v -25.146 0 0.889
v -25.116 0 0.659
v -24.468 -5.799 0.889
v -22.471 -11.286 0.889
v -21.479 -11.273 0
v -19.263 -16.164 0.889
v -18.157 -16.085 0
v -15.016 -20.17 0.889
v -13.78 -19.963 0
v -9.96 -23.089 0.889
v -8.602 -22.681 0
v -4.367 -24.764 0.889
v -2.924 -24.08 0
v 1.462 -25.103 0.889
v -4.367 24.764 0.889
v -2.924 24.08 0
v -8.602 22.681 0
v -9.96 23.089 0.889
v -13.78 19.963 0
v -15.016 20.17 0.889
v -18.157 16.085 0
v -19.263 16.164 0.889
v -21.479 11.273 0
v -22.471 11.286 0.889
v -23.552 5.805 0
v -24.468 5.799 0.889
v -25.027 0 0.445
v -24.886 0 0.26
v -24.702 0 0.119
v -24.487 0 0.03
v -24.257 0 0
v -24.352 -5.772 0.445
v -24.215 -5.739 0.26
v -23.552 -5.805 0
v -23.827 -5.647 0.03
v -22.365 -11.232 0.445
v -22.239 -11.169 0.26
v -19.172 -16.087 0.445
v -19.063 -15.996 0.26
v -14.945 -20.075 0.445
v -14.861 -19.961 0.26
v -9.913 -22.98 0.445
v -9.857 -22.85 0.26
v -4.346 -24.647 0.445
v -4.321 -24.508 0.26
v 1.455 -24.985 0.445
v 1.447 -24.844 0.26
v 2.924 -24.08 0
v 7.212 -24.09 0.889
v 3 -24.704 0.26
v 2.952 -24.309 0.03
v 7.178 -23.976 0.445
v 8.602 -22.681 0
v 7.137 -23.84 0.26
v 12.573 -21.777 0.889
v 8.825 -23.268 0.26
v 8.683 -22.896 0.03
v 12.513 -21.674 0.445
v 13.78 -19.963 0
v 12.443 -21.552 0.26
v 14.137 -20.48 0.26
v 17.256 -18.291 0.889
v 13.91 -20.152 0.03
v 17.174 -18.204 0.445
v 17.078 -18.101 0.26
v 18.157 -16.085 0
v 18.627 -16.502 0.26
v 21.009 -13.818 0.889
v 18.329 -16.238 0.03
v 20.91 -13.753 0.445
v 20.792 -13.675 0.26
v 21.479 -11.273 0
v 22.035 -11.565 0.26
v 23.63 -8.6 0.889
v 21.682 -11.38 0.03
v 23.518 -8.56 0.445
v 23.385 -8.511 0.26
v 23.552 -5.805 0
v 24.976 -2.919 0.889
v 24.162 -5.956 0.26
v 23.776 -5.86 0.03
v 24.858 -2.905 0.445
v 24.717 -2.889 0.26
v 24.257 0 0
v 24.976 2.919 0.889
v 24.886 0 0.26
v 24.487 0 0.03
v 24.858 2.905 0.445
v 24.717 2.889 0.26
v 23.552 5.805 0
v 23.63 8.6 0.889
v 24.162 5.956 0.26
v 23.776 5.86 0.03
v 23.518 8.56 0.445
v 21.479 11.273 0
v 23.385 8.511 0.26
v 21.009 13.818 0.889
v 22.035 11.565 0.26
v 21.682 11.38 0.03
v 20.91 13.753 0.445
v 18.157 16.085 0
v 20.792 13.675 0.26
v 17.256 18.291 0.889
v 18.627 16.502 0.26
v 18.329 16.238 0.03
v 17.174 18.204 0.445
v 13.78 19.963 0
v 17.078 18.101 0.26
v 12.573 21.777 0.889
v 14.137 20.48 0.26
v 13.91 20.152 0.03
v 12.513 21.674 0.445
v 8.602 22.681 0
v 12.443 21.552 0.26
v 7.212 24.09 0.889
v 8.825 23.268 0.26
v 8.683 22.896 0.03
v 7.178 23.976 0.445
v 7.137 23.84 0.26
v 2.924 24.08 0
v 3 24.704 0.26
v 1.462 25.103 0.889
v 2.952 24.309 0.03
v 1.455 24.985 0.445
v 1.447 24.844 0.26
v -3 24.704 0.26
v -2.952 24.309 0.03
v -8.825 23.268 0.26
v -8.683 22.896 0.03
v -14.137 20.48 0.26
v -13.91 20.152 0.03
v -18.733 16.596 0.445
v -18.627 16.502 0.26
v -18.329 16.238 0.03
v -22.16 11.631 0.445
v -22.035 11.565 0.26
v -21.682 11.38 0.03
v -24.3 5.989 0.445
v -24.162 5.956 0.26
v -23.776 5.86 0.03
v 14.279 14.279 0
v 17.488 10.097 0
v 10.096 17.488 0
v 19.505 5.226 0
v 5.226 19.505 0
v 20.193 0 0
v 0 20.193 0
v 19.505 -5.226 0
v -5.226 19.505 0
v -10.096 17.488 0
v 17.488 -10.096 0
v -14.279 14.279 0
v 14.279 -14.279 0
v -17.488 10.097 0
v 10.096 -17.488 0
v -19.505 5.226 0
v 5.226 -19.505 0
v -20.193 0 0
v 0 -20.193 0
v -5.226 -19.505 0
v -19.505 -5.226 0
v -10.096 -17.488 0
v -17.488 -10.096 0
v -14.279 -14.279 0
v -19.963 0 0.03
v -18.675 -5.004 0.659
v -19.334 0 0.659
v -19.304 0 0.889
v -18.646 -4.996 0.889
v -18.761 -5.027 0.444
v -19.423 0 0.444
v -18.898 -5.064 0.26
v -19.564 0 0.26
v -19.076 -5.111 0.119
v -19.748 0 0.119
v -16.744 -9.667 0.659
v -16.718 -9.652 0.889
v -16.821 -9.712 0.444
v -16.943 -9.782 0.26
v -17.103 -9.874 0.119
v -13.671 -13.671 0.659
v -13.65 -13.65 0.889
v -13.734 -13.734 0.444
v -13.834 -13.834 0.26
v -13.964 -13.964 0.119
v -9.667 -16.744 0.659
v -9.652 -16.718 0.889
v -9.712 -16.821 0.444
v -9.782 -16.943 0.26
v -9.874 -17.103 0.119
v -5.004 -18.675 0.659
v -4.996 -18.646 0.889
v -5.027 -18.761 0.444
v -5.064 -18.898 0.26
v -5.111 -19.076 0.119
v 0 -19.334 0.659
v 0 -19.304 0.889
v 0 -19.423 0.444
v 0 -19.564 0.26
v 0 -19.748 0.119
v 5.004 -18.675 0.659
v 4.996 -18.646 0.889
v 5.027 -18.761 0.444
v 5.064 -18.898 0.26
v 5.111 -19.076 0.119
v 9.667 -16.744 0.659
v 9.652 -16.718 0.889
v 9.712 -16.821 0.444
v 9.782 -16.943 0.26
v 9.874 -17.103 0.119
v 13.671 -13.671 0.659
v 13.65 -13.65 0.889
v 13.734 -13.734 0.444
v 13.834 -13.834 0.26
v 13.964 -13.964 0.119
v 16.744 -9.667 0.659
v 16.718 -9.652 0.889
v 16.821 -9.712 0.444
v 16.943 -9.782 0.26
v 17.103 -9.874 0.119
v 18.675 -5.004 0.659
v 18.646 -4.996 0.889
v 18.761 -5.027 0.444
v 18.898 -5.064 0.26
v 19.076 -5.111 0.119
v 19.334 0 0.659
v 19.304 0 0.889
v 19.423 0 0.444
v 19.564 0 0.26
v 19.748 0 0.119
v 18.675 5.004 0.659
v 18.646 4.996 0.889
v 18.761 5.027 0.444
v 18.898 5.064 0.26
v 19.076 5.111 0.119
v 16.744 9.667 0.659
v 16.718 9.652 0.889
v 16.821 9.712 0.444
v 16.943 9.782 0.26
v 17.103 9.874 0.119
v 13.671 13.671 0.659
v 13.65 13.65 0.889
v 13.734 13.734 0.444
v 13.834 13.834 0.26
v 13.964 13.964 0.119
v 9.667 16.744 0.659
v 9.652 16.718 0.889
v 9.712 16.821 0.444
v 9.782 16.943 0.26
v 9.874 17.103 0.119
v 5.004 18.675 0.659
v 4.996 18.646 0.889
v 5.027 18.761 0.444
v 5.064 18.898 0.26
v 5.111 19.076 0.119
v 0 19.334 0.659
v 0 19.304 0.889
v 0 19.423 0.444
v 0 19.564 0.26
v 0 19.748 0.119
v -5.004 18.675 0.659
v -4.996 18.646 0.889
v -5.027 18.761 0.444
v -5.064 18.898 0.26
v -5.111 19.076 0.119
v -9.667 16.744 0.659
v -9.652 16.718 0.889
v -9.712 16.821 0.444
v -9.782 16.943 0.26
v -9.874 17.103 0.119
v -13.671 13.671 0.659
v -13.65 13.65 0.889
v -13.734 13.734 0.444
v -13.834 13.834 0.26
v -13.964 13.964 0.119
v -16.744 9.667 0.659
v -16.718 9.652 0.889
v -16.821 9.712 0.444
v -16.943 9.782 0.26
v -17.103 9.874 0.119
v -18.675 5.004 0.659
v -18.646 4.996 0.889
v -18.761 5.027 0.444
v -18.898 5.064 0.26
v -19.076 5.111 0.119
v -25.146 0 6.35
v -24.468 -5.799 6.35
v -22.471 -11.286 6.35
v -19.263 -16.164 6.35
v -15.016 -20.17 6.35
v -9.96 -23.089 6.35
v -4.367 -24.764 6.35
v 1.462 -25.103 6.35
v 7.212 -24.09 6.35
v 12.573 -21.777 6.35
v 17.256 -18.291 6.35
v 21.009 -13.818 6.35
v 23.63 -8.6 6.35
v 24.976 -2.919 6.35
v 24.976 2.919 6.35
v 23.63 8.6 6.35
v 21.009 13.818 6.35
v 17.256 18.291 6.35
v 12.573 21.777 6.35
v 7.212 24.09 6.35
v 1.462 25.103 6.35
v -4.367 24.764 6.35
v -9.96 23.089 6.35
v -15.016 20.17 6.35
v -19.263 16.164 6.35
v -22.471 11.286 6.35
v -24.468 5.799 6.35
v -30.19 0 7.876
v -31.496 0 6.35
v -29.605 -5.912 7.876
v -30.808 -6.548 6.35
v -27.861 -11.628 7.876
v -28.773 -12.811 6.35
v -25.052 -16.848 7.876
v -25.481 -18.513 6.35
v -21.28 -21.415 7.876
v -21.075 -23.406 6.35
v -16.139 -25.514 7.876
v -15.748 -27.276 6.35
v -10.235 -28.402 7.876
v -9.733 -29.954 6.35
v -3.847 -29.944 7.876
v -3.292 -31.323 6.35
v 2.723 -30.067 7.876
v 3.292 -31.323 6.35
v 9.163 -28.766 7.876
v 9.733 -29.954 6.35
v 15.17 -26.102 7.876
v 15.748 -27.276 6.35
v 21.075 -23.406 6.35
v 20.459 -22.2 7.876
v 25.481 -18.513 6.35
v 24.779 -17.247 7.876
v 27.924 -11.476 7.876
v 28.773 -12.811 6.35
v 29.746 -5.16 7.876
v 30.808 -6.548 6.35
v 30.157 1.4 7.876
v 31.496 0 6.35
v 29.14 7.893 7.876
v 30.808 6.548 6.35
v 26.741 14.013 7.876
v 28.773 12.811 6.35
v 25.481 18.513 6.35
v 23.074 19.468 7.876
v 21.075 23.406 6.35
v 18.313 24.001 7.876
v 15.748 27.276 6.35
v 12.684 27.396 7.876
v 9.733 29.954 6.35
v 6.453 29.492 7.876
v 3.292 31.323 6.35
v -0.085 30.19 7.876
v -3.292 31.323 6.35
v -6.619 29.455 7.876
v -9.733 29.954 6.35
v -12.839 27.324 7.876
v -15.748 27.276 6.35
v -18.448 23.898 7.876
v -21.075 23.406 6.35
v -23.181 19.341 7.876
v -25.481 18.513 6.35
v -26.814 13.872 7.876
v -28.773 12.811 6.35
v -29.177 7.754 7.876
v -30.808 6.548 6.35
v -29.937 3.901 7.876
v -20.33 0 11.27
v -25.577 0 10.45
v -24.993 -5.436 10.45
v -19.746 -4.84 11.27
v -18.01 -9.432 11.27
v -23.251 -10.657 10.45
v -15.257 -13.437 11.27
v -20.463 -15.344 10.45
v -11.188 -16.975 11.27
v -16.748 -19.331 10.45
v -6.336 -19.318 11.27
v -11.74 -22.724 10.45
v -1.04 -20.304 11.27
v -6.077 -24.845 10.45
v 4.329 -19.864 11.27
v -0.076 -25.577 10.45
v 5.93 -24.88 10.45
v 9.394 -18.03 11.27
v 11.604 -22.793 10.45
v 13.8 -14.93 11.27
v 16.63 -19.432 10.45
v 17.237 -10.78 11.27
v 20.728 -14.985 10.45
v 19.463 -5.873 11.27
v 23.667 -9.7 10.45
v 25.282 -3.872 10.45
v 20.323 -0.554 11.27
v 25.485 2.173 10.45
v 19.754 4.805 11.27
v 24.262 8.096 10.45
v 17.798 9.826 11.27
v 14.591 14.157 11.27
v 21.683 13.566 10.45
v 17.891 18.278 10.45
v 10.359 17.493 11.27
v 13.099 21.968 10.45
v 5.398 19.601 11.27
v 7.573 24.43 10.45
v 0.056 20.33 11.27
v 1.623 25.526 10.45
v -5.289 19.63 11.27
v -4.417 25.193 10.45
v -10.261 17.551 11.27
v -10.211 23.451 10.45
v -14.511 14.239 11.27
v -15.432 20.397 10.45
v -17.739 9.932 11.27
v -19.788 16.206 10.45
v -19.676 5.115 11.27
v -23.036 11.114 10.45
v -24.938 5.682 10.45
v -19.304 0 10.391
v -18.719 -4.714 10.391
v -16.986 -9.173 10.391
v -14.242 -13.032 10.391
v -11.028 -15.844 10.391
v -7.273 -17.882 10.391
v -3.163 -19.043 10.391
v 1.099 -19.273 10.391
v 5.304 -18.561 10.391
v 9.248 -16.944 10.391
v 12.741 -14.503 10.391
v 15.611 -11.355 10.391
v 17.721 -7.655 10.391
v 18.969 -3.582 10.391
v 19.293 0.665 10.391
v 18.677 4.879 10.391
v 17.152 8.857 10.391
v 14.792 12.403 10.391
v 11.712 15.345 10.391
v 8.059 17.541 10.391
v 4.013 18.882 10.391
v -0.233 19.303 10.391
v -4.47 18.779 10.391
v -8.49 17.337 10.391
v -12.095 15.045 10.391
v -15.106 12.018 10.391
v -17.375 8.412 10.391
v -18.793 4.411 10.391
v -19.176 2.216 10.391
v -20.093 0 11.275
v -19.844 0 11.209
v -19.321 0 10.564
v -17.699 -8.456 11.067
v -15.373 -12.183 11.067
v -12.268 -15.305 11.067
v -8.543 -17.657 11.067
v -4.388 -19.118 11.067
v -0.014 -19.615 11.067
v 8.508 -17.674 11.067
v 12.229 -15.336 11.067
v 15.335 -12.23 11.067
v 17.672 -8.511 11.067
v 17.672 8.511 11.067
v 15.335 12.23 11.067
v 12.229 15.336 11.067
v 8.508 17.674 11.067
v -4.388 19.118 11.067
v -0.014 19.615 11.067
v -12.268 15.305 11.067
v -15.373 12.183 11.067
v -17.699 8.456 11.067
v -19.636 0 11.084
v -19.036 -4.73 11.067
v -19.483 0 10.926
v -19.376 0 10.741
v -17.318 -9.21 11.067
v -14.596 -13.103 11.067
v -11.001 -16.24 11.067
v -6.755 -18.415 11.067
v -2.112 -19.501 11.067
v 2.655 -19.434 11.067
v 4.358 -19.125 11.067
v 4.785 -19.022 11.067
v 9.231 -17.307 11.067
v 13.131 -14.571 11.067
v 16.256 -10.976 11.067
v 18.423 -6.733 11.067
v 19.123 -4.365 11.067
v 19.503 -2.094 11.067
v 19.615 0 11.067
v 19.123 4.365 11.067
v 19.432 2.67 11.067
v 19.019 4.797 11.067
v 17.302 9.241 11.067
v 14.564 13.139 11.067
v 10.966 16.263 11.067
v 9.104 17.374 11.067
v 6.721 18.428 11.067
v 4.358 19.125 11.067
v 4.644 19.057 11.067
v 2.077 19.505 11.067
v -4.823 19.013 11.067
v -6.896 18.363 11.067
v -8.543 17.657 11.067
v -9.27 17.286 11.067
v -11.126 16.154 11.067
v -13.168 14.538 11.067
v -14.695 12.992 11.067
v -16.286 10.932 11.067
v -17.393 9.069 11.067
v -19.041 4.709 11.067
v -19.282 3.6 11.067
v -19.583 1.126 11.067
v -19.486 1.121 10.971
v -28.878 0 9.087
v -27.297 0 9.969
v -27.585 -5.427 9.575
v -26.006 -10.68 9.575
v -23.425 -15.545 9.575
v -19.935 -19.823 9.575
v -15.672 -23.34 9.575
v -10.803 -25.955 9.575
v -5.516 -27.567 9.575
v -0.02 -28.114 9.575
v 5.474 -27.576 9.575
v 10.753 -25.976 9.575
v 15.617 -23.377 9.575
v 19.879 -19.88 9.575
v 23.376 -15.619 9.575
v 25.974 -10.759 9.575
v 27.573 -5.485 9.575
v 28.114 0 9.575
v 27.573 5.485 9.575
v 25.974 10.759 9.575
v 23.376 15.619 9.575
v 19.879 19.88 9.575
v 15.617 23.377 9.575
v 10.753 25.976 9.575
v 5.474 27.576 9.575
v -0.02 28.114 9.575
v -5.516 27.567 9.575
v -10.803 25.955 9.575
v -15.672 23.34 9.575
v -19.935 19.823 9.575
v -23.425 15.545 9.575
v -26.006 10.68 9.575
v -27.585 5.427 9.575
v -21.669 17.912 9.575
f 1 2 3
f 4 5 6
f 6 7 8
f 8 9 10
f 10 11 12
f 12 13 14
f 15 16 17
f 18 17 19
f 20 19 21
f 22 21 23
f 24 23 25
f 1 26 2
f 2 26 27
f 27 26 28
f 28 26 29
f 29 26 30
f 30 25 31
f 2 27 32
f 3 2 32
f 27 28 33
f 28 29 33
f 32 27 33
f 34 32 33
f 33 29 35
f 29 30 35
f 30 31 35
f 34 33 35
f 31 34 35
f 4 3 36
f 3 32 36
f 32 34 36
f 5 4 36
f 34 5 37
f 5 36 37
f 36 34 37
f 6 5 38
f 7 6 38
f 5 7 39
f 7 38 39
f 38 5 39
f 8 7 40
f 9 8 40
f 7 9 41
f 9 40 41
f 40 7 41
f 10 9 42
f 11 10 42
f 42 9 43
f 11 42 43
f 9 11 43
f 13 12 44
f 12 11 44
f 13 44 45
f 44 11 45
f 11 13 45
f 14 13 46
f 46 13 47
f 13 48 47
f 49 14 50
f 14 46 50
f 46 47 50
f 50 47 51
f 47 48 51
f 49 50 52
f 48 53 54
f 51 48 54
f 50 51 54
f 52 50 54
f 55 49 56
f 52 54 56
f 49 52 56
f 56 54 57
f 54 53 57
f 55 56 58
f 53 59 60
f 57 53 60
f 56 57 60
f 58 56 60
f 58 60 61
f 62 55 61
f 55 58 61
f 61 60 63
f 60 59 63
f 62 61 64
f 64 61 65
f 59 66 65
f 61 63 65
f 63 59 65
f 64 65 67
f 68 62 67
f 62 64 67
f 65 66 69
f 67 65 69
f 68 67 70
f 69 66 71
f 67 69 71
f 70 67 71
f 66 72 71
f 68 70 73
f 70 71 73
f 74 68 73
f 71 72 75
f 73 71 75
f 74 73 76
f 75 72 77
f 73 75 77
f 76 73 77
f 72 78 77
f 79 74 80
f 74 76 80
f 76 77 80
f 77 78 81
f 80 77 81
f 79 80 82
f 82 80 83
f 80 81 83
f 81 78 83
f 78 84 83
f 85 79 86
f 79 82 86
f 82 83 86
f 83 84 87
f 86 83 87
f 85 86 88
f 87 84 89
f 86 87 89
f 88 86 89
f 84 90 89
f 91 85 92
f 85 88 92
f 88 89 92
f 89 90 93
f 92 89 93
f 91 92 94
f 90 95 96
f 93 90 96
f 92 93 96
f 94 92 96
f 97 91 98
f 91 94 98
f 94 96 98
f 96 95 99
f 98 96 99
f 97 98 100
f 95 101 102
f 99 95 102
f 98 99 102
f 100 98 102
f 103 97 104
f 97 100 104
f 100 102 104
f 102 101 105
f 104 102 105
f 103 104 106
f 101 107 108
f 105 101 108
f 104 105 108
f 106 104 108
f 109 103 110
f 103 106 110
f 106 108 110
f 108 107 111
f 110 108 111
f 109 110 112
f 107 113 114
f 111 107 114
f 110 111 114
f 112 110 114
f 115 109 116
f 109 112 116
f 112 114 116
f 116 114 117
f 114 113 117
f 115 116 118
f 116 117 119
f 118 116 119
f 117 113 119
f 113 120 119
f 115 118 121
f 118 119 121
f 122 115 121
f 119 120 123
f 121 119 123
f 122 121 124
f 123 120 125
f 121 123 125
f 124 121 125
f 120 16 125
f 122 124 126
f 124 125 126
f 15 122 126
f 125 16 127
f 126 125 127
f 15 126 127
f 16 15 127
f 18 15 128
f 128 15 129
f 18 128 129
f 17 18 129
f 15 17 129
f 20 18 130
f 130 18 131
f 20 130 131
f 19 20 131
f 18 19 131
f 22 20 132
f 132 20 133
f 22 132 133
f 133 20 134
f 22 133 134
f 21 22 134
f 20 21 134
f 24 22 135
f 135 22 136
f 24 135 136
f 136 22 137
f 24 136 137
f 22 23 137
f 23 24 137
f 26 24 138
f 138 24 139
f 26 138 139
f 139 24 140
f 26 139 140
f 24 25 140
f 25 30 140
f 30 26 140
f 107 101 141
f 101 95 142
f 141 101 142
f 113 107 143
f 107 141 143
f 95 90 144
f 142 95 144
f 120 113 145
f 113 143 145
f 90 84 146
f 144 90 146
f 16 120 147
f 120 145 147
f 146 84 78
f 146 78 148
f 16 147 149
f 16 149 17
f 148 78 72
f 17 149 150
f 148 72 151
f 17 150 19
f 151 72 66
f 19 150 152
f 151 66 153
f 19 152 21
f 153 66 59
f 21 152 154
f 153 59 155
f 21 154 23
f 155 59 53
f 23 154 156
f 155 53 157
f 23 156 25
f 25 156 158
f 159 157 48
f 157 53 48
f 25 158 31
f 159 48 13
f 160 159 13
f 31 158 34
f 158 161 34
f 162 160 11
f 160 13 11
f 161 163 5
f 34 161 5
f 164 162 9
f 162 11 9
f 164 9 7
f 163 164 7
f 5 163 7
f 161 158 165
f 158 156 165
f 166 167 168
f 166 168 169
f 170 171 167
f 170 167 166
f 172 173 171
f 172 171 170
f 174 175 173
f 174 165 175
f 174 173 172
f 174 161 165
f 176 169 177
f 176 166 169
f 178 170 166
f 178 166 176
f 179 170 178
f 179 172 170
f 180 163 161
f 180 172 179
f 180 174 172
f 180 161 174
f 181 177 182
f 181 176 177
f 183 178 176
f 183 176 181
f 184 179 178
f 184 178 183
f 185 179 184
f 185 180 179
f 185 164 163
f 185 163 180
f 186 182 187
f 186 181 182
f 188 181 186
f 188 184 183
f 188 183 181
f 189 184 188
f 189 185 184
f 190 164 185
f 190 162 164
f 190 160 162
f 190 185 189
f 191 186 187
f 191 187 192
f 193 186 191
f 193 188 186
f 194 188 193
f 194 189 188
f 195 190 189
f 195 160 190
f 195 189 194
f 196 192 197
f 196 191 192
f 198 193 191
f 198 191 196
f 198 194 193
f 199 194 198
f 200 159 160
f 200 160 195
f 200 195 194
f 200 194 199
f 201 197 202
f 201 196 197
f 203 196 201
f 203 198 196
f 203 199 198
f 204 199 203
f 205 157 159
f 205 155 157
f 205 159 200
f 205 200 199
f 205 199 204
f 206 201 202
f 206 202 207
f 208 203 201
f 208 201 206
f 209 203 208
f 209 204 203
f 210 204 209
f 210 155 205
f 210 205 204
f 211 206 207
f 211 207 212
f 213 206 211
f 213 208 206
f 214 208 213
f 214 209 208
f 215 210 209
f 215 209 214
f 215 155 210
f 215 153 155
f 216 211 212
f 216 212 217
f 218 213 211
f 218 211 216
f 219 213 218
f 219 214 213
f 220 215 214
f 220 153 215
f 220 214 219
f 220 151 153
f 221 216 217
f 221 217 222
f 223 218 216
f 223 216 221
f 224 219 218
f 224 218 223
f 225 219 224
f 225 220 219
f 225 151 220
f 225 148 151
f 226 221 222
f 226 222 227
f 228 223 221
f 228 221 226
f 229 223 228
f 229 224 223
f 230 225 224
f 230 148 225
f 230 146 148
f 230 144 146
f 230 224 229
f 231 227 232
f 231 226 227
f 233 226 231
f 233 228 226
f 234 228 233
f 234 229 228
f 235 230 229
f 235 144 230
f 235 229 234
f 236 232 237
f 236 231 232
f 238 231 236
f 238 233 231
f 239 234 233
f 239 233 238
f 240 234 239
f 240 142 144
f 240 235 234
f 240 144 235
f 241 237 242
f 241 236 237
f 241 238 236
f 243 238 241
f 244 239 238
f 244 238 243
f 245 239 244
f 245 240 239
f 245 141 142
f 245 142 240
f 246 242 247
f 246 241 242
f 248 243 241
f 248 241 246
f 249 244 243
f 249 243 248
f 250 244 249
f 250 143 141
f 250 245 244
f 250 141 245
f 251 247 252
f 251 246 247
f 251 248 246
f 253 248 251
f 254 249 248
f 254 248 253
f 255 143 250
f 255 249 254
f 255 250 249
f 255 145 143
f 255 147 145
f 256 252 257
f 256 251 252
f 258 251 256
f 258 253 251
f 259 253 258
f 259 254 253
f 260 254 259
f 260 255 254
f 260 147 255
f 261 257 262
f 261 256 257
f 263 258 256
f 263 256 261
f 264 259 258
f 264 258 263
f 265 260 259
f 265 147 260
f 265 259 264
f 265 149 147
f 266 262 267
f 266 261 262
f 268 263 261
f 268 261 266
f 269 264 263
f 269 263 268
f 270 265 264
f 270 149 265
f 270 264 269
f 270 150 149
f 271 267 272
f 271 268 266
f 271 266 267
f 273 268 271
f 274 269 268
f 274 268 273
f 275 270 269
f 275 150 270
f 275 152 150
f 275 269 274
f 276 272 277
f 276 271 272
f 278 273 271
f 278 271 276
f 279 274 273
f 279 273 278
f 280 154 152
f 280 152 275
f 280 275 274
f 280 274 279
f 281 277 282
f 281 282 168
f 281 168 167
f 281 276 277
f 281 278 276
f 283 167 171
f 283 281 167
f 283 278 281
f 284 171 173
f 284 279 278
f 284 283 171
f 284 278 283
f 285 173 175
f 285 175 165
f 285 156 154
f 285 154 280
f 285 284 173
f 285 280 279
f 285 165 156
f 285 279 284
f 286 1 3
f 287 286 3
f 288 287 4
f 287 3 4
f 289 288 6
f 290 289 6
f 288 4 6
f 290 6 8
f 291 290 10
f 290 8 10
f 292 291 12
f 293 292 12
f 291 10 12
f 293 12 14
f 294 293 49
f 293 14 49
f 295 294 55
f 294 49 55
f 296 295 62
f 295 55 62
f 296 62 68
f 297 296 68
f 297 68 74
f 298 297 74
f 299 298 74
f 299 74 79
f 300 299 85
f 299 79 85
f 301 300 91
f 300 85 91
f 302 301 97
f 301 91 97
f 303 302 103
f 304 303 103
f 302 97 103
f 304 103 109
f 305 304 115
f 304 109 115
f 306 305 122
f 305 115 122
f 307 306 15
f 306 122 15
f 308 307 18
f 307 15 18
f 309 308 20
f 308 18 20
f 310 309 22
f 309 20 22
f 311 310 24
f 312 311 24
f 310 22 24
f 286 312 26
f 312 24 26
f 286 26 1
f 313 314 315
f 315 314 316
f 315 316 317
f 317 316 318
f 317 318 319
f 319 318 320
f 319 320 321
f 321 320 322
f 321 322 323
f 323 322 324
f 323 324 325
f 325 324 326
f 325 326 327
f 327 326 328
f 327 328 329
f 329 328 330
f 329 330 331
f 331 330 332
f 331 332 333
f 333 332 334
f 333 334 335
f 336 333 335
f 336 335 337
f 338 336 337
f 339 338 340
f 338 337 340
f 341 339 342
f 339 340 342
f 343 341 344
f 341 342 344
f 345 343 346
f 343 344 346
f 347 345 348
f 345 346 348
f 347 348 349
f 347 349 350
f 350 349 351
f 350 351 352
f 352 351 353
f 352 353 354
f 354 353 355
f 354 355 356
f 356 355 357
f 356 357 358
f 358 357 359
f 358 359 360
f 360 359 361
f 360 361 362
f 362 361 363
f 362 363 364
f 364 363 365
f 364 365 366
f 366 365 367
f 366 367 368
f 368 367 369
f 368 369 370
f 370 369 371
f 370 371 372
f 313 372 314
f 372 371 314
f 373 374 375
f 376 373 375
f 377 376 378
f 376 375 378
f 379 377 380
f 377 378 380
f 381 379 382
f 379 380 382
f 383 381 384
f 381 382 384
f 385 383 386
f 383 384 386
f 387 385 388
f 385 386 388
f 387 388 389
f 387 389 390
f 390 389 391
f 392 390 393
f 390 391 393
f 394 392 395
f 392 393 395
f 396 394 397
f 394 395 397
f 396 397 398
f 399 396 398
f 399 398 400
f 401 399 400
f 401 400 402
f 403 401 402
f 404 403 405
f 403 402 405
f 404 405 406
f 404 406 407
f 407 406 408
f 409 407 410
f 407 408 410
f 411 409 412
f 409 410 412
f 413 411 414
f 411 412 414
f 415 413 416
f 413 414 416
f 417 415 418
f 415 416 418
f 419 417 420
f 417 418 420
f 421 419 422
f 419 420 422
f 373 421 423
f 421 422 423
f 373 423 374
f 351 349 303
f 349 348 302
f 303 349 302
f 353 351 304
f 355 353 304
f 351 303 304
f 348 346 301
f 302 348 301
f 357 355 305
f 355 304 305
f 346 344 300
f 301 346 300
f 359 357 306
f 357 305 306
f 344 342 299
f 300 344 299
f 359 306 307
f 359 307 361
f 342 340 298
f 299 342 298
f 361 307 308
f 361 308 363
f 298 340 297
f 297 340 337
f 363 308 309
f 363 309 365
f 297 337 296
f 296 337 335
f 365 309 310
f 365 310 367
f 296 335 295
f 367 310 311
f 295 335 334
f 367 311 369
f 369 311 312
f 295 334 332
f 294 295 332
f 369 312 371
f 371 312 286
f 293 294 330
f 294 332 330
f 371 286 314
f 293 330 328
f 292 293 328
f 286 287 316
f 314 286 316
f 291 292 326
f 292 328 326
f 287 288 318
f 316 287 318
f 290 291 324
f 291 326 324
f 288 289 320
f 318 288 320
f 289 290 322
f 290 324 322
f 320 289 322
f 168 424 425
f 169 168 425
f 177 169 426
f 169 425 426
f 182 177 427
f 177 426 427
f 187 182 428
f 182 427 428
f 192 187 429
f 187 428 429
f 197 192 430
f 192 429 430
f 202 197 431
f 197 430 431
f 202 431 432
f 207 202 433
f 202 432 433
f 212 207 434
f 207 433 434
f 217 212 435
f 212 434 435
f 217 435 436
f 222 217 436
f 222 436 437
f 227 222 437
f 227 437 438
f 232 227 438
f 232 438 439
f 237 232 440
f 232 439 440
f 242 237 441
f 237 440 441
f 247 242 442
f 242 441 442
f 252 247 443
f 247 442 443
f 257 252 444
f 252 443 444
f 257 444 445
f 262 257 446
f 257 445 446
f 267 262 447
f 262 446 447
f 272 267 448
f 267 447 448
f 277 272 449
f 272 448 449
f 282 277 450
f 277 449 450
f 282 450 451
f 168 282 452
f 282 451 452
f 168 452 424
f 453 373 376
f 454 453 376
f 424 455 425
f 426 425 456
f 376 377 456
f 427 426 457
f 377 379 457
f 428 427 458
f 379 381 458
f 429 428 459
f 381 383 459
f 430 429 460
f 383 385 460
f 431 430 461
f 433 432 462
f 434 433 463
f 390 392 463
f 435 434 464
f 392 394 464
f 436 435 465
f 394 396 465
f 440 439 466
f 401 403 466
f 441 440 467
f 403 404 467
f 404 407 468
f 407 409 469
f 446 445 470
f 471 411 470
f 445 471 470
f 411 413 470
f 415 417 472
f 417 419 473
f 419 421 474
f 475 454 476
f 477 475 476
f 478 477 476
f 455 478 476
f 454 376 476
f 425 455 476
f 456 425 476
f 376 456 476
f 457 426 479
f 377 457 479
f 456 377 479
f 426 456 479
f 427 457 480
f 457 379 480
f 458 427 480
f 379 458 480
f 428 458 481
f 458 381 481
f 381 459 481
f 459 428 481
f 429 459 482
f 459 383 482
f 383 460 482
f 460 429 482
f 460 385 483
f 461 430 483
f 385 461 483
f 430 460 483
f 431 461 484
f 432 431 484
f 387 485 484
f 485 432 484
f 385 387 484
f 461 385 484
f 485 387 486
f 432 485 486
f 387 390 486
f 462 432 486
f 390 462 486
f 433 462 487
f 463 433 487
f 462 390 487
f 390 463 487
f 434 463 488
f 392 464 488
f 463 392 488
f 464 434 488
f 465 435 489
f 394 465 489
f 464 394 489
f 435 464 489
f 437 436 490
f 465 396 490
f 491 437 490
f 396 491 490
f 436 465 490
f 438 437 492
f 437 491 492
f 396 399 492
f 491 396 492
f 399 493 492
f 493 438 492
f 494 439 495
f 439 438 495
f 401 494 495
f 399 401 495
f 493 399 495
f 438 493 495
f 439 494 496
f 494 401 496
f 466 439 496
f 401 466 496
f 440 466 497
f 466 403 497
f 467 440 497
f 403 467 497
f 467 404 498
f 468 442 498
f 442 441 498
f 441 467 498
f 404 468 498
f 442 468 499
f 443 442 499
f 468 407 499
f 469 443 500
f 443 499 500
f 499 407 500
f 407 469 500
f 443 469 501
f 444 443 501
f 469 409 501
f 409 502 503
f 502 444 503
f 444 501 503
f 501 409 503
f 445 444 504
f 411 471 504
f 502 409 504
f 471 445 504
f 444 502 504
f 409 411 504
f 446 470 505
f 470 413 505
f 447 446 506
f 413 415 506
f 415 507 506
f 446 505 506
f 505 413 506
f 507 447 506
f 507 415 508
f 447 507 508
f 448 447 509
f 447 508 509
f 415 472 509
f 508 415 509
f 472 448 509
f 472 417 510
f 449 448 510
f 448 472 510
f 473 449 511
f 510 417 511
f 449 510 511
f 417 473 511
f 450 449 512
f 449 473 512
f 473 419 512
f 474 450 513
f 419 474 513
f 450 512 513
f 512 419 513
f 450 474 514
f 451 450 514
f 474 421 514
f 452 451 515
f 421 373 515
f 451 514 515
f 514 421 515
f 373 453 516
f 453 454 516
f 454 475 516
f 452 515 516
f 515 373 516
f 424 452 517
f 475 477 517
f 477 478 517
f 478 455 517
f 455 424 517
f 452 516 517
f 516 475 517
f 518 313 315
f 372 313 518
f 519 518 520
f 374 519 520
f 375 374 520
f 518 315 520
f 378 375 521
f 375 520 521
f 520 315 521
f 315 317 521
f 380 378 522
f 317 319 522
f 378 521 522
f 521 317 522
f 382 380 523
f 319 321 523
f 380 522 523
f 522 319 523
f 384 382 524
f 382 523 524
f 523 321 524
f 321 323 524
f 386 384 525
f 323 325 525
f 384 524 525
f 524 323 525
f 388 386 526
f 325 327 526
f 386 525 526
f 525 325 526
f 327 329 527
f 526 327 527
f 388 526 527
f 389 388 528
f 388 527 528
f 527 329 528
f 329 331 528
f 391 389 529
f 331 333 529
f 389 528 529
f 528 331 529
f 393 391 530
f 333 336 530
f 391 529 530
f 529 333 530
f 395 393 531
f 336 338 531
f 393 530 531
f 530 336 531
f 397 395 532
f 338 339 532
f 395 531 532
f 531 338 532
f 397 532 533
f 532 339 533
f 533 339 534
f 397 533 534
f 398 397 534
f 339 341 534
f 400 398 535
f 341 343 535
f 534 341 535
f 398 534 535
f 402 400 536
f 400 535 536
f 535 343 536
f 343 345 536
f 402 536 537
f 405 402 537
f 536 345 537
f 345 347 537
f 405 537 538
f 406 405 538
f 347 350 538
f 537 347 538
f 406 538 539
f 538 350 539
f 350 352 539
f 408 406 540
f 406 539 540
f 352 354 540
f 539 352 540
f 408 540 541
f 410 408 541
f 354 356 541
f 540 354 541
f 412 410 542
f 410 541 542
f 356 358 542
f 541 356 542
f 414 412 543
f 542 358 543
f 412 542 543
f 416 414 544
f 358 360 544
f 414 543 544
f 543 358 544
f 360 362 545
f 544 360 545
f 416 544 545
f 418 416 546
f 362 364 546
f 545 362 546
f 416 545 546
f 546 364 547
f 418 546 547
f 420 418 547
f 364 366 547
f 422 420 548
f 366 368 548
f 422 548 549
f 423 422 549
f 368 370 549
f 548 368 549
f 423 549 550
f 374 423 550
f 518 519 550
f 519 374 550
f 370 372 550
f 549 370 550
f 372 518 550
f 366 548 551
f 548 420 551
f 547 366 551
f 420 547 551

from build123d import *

# Parameters (mm, degrees)
F3_R = 7.62
F4_R = 0.889


# Not quite as in the source:
# - a fillet or chamfer that OpenCascade refuses, or shapes differently, is made with other operations: its cross-section is extruded or revolved along the edge and cut away or added


with BuildPart() as f1:
    # F0 (on Front) → F1 (revolve)
    with BuildSketch(Plane.XZ):
        Polygon((-25.146, 6.35), (-25.146, 0), (-19.304, 0), (-19.304, 11.43), (-31.496, 9.525), (-31.496, 6.35), align=None)
    revolve(axis=Axis((0, 0, 48.3202852037), (0, 0, 1)))

    # F2: chamfer of 3.175 on 1 edges, made by hand

    # F2_s1 → F2_t2 (revolve, cut)
    with BuildSketch(Plane.XZ):
        Polygon((-28.3590617928, 10.0151465949), (-31.496, 6.35), (-31.496, 9.525), align=None)
    revolve(axis=Axis((0, 0, 9.525), (0, 0, 1)), mode=Mode.SUBTRACT)

    # F3
    f3_edges = [f1.edges().sort_by_distance(p)[0] for p in [
        (28.359062, 0, 10.015147),
    ]]
    fillet(f3_edges, radius=F3_R)

    # F4
    f4_edges = [f1.edges().sort_by_distance(p)[0] for p in [
        (19.304, 0, 11.43),
        (19.304, 0, 0),
        (25.146, 0, 0),
    ]]
    fillet(f4_edges, radius=F4_R)


solid = f1.part
